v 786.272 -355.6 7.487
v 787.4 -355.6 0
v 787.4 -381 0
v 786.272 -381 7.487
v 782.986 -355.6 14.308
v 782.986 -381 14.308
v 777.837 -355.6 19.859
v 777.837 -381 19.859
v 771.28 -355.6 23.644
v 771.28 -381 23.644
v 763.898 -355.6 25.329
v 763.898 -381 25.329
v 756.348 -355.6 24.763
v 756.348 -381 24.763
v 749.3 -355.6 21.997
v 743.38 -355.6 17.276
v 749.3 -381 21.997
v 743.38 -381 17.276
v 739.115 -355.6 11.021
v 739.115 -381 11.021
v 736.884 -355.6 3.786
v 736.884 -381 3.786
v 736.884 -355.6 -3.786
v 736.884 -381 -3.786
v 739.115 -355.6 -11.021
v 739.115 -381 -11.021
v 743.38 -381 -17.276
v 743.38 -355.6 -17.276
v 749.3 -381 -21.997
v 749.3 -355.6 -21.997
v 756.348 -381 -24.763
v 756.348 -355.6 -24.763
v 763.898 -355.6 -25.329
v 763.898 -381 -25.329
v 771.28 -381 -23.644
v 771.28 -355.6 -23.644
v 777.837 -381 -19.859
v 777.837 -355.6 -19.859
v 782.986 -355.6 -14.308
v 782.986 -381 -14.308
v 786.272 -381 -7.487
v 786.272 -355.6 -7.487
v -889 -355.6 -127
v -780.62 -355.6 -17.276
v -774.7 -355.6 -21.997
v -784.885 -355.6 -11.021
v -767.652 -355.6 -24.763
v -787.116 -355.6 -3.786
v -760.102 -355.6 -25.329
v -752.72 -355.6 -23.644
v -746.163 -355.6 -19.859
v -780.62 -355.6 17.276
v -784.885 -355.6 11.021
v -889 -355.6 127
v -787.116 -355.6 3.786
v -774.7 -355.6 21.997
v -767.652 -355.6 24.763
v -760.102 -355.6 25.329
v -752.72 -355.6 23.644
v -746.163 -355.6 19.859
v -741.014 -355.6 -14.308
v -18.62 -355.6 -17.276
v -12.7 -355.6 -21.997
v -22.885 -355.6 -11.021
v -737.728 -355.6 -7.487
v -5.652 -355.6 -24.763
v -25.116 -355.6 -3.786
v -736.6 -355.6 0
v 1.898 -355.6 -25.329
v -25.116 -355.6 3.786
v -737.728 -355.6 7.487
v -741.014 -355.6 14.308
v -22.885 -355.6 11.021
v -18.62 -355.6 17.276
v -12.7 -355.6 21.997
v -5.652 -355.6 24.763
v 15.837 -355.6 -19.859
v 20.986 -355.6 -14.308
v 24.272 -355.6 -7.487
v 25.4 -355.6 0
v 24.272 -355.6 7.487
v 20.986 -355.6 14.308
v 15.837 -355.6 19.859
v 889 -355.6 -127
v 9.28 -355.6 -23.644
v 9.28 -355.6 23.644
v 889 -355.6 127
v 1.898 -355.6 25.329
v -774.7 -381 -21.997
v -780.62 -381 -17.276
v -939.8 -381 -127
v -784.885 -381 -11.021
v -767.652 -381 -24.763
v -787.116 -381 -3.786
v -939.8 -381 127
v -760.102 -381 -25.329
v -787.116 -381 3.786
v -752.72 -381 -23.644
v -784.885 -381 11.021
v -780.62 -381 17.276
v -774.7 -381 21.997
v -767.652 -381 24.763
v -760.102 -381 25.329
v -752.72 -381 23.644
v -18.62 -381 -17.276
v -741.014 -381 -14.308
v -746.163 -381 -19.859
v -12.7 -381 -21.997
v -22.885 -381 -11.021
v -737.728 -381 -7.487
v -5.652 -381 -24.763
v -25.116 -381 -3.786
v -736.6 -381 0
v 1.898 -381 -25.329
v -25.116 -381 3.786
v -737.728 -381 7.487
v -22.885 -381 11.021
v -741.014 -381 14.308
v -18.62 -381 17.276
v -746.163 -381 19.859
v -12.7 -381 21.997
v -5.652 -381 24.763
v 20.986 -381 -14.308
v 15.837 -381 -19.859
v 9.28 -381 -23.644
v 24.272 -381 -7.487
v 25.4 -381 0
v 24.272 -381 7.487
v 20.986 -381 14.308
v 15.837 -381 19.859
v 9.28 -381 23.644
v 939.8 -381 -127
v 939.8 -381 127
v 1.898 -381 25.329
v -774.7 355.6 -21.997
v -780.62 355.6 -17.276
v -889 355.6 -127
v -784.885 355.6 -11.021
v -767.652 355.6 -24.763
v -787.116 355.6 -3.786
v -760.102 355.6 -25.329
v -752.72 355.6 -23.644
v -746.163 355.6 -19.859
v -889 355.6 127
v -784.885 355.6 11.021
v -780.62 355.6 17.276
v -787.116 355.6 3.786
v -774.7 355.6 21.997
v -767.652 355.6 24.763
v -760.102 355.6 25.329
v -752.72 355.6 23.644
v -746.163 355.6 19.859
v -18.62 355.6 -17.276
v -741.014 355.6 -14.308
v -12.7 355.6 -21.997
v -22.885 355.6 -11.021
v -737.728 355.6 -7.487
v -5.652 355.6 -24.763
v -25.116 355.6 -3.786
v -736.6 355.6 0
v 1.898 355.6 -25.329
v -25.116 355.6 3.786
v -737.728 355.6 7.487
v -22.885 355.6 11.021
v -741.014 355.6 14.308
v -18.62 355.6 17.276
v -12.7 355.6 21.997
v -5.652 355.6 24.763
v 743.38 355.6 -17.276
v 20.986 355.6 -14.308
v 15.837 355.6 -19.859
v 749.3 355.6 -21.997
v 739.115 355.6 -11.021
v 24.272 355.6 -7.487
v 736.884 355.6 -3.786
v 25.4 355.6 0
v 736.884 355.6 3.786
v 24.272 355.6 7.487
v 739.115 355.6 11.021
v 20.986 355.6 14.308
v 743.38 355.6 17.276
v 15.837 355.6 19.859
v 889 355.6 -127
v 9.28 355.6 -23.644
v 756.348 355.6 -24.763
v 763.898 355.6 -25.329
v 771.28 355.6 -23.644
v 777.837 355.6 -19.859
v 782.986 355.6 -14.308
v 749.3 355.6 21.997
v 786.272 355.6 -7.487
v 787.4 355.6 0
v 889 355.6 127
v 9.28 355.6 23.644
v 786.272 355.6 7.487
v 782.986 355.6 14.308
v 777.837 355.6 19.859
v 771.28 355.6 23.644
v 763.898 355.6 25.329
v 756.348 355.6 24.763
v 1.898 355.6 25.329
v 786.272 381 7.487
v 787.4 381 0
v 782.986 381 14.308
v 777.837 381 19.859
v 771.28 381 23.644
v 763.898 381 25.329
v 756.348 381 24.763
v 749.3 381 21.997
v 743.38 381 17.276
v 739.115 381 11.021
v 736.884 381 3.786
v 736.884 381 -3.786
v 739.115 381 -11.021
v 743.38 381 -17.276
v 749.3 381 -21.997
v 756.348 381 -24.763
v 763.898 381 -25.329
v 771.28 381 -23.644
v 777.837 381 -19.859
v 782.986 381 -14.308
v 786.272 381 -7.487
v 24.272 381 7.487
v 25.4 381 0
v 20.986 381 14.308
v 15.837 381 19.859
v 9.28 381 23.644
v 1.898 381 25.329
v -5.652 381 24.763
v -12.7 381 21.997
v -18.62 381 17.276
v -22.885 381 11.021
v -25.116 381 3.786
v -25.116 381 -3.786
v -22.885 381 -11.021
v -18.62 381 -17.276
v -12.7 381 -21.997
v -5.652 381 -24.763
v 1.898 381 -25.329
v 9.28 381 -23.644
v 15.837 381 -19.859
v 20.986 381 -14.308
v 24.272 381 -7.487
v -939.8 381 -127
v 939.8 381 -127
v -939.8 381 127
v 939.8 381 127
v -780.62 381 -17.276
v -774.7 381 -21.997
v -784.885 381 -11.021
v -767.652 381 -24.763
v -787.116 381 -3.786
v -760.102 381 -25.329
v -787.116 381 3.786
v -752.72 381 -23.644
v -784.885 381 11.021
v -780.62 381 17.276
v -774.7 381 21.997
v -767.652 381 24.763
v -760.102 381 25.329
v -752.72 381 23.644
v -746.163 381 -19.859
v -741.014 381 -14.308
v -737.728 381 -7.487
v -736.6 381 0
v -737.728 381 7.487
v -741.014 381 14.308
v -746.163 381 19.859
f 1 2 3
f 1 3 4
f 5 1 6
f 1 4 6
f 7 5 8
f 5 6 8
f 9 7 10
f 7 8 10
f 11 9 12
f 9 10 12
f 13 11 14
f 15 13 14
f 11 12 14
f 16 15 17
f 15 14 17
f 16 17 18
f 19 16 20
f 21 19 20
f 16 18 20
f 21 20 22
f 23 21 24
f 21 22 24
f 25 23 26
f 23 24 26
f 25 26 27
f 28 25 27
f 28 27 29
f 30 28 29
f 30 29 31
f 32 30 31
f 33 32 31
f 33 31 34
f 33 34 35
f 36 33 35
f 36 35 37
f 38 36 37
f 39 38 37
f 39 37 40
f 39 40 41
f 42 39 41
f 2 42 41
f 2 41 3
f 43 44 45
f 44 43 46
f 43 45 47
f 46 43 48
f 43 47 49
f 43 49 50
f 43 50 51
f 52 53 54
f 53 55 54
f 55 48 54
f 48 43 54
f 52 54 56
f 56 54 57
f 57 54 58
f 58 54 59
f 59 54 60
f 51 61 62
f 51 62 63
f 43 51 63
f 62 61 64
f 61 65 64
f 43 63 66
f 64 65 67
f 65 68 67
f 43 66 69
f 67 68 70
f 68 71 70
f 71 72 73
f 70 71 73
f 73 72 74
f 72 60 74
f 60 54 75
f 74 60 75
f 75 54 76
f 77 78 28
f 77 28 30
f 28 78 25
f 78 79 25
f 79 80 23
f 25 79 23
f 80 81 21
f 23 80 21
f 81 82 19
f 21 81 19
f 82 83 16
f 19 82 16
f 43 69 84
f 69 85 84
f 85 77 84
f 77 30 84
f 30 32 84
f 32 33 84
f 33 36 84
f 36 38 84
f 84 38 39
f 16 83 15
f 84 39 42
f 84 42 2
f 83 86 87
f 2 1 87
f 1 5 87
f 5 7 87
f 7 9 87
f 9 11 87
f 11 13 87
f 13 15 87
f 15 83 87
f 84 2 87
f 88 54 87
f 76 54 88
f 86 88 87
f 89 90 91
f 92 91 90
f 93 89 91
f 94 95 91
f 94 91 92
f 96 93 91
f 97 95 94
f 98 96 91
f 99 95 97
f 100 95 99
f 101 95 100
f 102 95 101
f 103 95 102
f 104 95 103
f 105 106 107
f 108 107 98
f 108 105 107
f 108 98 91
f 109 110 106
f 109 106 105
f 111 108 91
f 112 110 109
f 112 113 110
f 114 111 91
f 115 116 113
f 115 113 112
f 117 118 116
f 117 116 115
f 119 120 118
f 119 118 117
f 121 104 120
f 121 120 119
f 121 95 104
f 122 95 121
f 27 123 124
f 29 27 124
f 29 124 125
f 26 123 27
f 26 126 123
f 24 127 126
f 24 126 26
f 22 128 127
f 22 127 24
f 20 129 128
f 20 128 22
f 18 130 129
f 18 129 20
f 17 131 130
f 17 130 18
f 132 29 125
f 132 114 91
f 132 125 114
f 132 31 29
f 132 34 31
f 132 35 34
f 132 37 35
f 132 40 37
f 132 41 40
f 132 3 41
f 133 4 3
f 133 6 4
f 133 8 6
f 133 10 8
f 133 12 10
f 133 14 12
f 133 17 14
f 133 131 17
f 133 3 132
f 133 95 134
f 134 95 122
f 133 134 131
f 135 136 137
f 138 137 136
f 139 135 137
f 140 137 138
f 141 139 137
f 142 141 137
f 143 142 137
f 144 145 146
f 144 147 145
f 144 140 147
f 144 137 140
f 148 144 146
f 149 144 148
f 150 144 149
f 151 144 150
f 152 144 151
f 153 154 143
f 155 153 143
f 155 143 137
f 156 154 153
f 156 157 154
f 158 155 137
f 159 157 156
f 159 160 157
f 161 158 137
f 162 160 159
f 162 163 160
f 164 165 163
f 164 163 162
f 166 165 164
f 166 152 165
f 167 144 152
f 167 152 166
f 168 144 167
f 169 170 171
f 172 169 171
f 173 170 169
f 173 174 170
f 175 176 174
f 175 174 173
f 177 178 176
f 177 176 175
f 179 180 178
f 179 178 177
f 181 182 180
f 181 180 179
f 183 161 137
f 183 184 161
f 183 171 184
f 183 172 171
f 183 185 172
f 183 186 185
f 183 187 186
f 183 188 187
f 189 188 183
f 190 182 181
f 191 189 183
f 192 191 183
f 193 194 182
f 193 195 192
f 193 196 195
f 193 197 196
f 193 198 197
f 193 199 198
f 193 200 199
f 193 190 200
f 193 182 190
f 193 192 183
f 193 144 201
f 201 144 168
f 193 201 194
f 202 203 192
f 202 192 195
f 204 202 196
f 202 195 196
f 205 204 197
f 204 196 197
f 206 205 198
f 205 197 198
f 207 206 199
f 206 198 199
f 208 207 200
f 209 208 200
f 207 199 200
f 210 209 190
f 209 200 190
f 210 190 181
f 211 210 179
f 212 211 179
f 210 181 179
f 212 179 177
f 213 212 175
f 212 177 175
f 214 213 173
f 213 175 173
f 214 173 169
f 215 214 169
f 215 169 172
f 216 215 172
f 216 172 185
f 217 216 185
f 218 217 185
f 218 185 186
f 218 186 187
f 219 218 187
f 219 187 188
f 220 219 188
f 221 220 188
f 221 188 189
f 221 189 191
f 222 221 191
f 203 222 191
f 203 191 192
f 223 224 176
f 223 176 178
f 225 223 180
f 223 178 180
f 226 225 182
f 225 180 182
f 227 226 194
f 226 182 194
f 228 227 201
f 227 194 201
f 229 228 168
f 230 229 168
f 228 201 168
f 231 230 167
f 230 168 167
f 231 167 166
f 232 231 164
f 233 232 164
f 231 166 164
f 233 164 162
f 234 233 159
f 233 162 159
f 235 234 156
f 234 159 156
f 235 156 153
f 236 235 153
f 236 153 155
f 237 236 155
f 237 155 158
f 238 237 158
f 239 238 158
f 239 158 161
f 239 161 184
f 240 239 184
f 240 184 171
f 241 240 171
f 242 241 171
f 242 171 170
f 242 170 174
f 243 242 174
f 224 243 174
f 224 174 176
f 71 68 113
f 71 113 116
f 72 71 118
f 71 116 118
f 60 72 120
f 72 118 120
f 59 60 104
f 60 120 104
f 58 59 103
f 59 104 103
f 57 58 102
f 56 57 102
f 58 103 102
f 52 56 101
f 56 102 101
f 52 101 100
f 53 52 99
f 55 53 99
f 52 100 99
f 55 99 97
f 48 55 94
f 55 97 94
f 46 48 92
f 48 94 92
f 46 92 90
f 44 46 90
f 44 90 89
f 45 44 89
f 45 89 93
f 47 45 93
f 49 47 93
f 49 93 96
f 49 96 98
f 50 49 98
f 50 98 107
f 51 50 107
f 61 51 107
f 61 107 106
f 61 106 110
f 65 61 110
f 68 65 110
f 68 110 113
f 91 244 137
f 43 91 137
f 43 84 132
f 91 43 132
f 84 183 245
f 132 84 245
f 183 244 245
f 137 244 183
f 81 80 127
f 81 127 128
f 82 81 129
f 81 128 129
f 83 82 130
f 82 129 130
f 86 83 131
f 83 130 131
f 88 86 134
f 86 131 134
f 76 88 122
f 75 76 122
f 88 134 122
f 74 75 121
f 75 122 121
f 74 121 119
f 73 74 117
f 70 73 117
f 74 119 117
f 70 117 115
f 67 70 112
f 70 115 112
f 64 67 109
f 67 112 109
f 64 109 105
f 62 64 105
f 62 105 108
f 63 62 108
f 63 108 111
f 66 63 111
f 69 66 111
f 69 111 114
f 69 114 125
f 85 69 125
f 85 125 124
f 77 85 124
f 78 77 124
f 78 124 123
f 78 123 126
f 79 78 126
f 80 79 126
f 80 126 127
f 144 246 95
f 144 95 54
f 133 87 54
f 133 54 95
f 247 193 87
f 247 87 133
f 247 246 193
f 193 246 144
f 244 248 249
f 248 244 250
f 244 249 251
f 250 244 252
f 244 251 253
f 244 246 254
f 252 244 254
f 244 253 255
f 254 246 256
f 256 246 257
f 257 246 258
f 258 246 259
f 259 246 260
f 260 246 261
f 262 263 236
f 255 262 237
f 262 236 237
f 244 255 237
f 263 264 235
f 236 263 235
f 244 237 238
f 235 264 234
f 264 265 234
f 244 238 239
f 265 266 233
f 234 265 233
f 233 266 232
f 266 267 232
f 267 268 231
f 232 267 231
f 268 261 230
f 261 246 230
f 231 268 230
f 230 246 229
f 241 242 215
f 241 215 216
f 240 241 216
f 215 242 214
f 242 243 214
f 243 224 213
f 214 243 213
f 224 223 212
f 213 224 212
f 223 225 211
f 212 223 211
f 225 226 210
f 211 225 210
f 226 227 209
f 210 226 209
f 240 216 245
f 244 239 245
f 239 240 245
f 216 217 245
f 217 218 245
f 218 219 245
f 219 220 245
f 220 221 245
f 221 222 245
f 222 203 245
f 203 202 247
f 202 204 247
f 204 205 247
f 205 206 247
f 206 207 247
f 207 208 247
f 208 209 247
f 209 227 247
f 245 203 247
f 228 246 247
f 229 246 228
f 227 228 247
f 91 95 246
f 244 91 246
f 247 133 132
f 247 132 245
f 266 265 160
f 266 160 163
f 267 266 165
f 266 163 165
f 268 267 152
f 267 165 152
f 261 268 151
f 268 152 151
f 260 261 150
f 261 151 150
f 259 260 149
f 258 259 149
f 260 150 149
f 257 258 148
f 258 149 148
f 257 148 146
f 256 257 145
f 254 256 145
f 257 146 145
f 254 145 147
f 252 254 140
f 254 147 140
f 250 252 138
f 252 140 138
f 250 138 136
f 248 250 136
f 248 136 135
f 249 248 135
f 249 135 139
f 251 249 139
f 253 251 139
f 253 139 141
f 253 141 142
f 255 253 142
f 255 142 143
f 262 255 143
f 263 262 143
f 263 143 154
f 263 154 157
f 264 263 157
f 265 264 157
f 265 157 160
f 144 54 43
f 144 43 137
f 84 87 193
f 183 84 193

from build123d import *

# Parameters (mm, degrees)
F0_W     = 1879.6
F0_H     = 762
F1_DEPTH = 127
F2_W     = 1778
F2_H     = 711.2
F3_DEPTH = 635
F4_R     = 25.4
F5_DEPTH = 762.001


# Not quite as in the source:
# - a feature names something its author has since deleted; it is built from what else it names


with BuildPart() as f1:
    # F0 (on Top) → F1 (new body, symmetric)
    with BuildSketch(Plane.XY):
        Rectangle(F0_W, F0_H)
    extrude(amount=F1_DEPTH, both=True)

    # F2 (on face) → F3 (cut, symmetric)
    with BuildSketch(Plane.XY.offset(127)):
        Rectangle(F2_W, F2_H)
    extrude(amount=F3_DEPTH, both=True, mode=Mode.SUBTRACT)

    # F4 (on face) → F5 (cut, through all)
    with BuildSketch(Plane.XZ.offset(381)):
        with Locations((-762, 0)):
            Circle(F4_R)
        with Locations((762, 0)):
            Circle(F4_R)
        Circle(F4_R)
    extrude(amount=-F5_DEPTH, mode=Mode.SUBTRACT)


solid = f1.part
